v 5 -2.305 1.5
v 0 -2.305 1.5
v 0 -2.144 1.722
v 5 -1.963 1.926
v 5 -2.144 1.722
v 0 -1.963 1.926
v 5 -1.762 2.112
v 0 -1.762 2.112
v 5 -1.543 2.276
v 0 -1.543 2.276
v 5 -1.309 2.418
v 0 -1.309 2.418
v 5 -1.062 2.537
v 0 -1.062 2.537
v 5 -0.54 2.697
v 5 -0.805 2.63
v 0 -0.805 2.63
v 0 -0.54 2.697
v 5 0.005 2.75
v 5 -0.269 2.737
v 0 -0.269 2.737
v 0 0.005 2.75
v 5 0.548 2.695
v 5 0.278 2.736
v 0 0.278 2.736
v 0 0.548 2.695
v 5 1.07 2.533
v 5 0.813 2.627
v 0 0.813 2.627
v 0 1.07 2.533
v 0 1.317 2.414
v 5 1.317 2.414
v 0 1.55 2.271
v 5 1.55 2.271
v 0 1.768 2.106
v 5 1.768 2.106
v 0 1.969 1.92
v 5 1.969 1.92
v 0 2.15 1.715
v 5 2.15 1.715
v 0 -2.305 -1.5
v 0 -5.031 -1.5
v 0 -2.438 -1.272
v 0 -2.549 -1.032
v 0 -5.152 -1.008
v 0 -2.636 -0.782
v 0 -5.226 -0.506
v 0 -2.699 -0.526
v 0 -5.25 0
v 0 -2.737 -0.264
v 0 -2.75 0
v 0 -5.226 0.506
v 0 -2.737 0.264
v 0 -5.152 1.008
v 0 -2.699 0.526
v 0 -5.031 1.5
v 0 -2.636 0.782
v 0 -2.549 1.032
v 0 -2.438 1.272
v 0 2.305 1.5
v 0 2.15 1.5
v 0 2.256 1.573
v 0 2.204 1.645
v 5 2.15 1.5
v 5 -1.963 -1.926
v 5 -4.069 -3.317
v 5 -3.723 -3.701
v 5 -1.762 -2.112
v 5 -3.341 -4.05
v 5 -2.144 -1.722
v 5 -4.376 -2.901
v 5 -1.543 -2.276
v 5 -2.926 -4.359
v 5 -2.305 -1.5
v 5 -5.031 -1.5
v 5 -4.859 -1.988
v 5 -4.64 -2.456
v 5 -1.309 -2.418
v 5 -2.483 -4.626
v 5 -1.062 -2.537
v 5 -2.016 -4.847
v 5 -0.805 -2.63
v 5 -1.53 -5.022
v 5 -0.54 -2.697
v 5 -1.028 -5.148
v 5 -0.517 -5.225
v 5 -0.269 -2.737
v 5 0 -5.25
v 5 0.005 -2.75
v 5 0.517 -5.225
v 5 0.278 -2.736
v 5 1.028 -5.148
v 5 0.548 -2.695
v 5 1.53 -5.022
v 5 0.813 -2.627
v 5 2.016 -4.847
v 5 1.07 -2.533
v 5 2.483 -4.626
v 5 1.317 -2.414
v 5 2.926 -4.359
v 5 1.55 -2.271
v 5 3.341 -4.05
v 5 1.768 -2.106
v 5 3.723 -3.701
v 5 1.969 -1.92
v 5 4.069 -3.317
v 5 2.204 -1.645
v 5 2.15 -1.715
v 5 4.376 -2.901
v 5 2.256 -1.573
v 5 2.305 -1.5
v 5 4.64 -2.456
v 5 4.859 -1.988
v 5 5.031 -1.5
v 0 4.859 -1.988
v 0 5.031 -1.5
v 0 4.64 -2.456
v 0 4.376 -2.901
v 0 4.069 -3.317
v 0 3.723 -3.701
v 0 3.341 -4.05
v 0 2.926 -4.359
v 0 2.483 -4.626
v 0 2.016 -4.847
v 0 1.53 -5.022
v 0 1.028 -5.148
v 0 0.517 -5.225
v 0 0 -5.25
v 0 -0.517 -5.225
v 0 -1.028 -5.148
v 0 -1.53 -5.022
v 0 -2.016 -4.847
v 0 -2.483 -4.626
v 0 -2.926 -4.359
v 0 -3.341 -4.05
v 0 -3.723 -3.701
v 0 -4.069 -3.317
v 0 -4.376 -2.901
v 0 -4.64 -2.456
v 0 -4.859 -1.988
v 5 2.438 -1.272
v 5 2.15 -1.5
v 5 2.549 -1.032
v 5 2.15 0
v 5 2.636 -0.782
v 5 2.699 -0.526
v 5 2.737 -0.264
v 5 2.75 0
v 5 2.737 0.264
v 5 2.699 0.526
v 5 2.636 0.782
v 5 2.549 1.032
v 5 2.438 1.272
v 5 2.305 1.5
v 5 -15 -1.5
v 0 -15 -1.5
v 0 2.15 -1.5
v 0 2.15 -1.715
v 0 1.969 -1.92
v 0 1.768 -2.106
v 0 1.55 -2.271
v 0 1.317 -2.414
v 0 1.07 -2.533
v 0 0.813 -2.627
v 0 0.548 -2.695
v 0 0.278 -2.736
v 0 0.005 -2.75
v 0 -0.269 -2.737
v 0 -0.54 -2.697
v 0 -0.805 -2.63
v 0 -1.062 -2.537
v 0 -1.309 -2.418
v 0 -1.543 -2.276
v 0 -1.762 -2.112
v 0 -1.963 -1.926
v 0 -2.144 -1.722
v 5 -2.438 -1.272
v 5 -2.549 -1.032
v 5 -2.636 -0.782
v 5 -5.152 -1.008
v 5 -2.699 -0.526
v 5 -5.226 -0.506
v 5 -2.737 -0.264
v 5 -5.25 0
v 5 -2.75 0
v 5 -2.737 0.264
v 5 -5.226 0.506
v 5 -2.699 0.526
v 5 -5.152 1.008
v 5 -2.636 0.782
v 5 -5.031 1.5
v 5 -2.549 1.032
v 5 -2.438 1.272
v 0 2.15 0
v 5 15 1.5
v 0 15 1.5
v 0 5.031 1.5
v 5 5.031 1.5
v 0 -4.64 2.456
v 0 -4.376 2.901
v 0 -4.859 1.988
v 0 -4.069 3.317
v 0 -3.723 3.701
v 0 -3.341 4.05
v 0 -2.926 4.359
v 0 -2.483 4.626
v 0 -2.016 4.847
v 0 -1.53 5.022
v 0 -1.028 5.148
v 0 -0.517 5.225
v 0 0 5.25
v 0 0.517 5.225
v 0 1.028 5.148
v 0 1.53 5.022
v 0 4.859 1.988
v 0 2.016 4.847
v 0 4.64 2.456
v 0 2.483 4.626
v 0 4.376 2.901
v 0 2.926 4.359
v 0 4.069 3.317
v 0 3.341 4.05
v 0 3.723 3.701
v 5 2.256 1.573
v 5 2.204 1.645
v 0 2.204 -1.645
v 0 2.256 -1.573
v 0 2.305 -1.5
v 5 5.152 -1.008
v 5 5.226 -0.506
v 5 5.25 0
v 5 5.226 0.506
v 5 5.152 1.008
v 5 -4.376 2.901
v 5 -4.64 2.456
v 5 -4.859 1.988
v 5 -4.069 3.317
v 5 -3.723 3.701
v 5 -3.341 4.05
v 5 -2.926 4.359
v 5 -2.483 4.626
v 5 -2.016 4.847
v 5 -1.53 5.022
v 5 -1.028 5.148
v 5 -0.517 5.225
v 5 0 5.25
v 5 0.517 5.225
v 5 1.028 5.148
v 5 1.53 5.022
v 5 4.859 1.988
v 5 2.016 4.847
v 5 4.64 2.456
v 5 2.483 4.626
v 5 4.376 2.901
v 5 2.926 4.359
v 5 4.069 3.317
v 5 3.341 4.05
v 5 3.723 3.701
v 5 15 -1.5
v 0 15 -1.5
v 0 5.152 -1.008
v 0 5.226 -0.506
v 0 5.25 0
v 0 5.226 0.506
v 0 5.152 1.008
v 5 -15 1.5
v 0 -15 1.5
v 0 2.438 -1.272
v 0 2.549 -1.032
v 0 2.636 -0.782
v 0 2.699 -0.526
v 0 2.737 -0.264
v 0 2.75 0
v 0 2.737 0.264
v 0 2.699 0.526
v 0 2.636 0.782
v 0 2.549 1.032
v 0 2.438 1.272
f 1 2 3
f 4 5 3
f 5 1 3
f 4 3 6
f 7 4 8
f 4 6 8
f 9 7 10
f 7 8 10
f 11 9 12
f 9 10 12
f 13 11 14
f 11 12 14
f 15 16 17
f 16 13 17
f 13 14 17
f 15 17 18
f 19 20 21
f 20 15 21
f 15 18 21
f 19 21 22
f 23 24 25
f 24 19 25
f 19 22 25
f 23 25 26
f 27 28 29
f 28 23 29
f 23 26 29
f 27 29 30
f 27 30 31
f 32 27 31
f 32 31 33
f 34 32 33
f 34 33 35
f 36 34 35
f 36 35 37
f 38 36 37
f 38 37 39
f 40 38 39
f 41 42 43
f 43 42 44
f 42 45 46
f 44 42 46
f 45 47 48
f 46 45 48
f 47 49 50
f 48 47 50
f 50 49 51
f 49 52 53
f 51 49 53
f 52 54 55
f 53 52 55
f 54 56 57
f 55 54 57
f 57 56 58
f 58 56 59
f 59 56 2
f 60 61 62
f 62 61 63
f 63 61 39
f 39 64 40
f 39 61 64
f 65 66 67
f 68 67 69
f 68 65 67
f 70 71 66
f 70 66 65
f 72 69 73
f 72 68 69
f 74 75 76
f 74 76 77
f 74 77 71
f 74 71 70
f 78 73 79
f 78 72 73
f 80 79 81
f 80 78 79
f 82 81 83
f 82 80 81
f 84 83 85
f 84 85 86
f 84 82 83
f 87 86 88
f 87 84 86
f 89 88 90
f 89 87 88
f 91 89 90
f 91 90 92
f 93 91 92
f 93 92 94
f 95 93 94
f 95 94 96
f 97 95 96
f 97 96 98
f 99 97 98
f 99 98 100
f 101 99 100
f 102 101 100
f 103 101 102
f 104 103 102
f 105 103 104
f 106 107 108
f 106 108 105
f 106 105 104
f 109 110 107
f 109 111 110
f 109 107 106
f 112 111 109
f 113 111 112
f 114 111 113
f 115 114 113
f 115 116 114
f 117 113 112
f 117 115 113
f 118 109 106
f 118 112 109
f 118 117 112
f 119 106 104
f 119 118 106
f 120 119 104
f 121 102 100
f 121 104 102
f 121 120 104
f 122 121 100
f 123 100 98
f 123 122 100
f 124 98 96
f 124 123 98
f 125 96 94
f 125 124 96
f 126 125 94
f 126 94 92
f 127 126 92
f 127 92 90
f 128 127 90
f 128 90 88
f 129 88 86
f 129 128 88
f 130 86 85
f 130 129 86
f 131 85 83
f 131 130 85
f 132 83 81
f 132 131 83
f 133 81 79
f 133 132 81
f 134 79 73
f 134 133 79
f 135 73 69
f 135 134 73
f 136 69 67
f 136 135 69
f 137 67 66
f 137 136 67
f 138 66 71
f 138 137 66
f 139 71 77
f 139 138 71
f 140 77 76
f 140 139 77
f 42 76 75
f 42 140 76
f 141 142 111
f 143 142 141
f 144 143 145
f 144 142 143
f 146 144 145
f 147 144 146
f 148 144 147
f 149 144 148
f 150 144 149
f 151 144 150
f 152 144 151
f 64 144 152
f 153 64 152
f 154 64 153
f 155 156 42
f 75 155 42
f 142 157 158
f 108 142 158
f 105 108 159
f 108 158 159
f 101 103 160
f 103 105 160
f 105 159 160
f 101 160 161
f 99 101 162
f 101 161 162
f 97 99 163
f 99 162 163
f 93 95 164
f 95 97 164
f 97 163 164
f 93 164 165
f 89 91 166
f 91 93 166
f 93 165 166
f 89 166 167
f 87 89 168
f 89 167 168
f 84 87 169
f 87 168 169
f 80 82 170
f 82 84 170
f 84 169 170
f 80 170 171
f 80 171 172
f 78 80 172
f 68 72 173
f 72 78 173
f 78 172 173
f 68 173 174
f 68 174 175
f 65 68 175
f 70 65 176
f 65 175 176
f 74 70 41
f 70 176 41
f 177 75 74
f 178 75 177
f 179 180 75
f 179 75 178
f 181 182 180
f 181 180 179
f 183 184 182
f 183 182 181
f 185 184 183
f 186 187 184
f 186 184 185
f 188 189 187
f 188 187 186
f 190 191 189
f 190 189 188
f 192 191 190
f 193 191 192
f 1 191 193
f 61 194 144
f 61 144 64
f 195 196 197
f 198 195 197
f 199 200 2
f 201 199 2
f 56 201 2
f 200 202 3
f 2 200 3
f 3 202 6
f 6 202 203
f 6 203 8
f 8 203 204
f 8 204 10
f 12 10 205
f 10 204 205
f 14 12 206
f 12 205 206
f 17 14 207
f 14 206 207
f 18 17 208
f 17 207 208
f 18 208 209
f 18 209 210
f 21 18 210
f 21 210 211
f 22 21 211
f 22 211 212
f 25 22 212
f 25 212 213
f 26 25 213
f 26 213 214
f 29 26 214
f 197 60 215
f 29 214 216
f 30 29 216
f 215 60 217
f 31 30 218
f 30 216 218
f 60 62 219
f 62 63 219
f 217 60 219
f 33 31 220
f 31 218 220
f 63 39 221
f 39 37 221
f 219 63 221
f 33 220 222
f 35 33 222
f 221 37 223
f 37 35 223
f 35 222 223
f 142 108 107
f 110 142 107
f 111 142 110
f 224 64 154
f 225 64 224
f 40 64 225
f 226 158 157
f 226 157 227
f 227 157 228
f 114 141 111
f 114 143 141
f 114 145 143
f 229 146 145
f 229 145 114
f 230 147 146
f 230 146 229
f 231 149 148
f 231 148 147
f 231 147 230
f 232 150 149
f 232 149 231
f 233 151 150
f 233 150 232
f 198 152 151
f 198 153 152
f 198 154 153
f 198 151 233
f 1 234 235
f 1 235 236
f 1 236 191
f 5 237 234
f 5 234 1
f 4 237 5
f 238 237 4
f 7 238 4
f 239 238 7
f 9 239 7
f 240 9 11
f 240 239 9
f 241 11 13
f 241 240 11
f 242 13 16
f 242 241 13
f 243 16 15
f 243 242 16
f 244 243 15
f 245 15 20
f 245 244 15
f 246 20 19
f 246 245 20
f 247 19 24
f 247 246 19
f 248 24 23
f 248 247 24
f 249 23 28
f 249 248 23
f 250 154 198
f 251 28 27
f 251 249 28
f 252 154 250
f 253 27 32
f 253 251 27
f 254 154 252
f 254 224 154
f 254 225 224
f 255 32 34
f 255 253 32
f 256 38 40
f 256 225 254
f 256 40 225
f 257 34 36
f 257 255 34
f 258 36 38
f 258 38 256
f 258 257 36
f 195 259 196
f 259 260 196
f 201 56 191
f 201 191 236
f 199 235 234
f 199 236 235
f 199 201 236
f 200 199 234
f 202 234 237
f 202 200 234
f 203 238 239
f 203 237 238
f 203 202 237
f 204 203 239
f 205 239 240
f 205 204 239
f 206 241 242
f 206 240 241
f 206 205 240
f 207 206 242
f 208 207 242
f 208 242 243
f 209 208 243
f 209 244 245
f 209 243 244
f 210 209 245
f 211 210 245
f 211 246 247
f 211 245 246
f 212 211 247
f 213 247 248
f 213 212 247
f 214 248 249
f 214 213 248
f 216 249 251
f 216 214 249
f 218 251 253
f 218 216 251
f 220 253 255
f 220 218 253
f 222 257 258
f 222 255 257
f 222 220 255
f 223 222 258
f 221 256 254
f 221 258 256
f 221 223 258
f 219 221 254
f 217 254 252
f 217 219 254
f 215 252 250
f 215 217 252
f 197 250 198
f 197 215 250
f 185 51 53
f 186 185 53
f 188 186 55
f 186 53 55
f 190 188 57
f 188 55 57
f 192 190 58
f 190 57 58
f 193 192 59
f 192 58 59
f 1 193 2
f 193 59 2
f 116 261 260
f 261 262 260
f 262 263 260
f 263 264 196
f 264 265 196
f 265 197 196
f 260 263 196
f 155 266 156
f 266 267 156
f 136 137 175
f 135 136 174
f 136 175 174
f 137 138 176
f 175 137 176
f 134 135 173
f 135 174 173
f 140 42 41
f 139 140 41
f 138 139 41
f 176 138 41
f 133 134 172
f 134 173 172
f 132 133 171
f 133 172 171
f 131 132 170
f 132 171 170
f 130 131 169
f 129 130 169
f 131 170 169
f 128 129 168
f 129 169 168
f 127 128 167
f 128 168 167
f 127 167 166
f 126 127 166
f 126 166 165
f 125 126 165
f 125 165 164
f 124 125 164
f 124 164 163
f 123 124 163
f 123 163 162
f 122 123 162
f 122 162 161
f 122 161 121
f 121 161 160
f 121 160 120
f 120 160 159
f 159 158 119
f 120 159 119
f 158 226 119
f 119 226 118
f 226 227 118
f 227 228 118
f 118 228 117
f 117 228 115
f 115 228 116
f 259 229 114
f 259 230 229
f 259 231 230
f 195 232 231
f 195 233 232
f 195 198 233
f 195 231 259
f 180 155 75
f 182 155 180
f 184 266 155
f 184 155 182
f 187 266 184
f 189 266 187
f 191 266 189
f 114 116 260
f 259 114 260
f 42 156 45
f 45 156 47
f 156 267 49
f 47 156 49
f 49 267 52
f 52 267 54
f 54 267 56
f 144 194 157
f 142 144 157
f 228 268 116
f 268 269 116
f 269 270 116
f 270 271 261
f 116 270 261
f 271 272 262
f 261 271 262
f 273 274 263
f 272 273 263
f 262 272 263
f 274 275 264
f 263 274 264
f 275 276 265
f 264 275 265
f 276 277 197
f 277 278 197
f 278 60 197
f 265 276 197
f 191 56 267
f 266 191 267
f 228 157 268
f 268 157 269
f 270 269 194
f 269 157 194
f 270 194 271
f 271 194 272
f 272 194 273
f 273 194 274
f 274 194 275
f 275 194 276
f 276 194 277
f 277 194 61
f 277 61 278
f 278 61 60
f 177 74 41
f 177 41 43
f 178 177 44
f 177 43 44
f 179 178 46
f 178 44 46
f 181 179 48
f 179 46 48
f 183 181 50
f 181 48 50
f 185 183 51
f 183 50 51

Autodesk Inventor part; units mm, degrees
ref_plane "YZ Plane" through (0, 0, 0) normal (1, 0, 0) x (0, 1, 0)
ref_plane "XZ Plane" through (0, 0, 0) normal (0, 1, 0) x (-1, 0, 0)
ref_plane "XY Plane" through (0, 0, 0) normal (0, 0, 1) x (1, 0, 0)
sketch "Sketch1" plane through (0, 0, 0) normal (1, 0, 0) x (0, 1, 0)
  circle A0 centre (0, 0) radius 2.75
  line L0 (-2.75, 0) -> (2.15, 0)
  line L1 (2.15, 0) -> (2.15, -1.7146)
  line L2 (2.15, 0) -> (2.15, 1.7146)
  circle A1 centre (0, 0) radius 5.25
  line L3 (15, 1.5) -> (-15, 1.5)
  line L4 (-15, 1.5) -> (-15, -1.5)
  line L5 (-15, -1.5) -> (15, -1.5)
  line L6 (15, -1.5) -> (15, 1.5)
  line L7 (15, 1.5) -> (-15, -1.5) construction
  line L8 (-15, 1.5) -> (15, -1.5) construction
  point P0 (5.0312, 1.5)
  point P1 (-5.0312, 1.5)
  point P2 (-5.0312, -1.5)
  point P3 (5.0312, -1.5)
  dimension "d0" = 5.5
  dimension "d3" = 4.9
  dimension "d4" = 2.5
  dimension "d5" = 30
  dimension "d6" = 3
extrude "Extrusion1" add sketch "Sketch1" along normal blind 5 contours A0 L5 L1 L2 L3 | A0 L3 A1 L5 | L3 L2 A0 | A0 L3 A1 | L5 A1 A0 | A0 L1 L5 | L3 L6 L5 A1 | A0 L5 A1 L3 | A1 L5 L4 L3 picked at (2.168, 1.6198) picked at (2.168, -1.6198)
properties part number "dshaft_fit_test"
